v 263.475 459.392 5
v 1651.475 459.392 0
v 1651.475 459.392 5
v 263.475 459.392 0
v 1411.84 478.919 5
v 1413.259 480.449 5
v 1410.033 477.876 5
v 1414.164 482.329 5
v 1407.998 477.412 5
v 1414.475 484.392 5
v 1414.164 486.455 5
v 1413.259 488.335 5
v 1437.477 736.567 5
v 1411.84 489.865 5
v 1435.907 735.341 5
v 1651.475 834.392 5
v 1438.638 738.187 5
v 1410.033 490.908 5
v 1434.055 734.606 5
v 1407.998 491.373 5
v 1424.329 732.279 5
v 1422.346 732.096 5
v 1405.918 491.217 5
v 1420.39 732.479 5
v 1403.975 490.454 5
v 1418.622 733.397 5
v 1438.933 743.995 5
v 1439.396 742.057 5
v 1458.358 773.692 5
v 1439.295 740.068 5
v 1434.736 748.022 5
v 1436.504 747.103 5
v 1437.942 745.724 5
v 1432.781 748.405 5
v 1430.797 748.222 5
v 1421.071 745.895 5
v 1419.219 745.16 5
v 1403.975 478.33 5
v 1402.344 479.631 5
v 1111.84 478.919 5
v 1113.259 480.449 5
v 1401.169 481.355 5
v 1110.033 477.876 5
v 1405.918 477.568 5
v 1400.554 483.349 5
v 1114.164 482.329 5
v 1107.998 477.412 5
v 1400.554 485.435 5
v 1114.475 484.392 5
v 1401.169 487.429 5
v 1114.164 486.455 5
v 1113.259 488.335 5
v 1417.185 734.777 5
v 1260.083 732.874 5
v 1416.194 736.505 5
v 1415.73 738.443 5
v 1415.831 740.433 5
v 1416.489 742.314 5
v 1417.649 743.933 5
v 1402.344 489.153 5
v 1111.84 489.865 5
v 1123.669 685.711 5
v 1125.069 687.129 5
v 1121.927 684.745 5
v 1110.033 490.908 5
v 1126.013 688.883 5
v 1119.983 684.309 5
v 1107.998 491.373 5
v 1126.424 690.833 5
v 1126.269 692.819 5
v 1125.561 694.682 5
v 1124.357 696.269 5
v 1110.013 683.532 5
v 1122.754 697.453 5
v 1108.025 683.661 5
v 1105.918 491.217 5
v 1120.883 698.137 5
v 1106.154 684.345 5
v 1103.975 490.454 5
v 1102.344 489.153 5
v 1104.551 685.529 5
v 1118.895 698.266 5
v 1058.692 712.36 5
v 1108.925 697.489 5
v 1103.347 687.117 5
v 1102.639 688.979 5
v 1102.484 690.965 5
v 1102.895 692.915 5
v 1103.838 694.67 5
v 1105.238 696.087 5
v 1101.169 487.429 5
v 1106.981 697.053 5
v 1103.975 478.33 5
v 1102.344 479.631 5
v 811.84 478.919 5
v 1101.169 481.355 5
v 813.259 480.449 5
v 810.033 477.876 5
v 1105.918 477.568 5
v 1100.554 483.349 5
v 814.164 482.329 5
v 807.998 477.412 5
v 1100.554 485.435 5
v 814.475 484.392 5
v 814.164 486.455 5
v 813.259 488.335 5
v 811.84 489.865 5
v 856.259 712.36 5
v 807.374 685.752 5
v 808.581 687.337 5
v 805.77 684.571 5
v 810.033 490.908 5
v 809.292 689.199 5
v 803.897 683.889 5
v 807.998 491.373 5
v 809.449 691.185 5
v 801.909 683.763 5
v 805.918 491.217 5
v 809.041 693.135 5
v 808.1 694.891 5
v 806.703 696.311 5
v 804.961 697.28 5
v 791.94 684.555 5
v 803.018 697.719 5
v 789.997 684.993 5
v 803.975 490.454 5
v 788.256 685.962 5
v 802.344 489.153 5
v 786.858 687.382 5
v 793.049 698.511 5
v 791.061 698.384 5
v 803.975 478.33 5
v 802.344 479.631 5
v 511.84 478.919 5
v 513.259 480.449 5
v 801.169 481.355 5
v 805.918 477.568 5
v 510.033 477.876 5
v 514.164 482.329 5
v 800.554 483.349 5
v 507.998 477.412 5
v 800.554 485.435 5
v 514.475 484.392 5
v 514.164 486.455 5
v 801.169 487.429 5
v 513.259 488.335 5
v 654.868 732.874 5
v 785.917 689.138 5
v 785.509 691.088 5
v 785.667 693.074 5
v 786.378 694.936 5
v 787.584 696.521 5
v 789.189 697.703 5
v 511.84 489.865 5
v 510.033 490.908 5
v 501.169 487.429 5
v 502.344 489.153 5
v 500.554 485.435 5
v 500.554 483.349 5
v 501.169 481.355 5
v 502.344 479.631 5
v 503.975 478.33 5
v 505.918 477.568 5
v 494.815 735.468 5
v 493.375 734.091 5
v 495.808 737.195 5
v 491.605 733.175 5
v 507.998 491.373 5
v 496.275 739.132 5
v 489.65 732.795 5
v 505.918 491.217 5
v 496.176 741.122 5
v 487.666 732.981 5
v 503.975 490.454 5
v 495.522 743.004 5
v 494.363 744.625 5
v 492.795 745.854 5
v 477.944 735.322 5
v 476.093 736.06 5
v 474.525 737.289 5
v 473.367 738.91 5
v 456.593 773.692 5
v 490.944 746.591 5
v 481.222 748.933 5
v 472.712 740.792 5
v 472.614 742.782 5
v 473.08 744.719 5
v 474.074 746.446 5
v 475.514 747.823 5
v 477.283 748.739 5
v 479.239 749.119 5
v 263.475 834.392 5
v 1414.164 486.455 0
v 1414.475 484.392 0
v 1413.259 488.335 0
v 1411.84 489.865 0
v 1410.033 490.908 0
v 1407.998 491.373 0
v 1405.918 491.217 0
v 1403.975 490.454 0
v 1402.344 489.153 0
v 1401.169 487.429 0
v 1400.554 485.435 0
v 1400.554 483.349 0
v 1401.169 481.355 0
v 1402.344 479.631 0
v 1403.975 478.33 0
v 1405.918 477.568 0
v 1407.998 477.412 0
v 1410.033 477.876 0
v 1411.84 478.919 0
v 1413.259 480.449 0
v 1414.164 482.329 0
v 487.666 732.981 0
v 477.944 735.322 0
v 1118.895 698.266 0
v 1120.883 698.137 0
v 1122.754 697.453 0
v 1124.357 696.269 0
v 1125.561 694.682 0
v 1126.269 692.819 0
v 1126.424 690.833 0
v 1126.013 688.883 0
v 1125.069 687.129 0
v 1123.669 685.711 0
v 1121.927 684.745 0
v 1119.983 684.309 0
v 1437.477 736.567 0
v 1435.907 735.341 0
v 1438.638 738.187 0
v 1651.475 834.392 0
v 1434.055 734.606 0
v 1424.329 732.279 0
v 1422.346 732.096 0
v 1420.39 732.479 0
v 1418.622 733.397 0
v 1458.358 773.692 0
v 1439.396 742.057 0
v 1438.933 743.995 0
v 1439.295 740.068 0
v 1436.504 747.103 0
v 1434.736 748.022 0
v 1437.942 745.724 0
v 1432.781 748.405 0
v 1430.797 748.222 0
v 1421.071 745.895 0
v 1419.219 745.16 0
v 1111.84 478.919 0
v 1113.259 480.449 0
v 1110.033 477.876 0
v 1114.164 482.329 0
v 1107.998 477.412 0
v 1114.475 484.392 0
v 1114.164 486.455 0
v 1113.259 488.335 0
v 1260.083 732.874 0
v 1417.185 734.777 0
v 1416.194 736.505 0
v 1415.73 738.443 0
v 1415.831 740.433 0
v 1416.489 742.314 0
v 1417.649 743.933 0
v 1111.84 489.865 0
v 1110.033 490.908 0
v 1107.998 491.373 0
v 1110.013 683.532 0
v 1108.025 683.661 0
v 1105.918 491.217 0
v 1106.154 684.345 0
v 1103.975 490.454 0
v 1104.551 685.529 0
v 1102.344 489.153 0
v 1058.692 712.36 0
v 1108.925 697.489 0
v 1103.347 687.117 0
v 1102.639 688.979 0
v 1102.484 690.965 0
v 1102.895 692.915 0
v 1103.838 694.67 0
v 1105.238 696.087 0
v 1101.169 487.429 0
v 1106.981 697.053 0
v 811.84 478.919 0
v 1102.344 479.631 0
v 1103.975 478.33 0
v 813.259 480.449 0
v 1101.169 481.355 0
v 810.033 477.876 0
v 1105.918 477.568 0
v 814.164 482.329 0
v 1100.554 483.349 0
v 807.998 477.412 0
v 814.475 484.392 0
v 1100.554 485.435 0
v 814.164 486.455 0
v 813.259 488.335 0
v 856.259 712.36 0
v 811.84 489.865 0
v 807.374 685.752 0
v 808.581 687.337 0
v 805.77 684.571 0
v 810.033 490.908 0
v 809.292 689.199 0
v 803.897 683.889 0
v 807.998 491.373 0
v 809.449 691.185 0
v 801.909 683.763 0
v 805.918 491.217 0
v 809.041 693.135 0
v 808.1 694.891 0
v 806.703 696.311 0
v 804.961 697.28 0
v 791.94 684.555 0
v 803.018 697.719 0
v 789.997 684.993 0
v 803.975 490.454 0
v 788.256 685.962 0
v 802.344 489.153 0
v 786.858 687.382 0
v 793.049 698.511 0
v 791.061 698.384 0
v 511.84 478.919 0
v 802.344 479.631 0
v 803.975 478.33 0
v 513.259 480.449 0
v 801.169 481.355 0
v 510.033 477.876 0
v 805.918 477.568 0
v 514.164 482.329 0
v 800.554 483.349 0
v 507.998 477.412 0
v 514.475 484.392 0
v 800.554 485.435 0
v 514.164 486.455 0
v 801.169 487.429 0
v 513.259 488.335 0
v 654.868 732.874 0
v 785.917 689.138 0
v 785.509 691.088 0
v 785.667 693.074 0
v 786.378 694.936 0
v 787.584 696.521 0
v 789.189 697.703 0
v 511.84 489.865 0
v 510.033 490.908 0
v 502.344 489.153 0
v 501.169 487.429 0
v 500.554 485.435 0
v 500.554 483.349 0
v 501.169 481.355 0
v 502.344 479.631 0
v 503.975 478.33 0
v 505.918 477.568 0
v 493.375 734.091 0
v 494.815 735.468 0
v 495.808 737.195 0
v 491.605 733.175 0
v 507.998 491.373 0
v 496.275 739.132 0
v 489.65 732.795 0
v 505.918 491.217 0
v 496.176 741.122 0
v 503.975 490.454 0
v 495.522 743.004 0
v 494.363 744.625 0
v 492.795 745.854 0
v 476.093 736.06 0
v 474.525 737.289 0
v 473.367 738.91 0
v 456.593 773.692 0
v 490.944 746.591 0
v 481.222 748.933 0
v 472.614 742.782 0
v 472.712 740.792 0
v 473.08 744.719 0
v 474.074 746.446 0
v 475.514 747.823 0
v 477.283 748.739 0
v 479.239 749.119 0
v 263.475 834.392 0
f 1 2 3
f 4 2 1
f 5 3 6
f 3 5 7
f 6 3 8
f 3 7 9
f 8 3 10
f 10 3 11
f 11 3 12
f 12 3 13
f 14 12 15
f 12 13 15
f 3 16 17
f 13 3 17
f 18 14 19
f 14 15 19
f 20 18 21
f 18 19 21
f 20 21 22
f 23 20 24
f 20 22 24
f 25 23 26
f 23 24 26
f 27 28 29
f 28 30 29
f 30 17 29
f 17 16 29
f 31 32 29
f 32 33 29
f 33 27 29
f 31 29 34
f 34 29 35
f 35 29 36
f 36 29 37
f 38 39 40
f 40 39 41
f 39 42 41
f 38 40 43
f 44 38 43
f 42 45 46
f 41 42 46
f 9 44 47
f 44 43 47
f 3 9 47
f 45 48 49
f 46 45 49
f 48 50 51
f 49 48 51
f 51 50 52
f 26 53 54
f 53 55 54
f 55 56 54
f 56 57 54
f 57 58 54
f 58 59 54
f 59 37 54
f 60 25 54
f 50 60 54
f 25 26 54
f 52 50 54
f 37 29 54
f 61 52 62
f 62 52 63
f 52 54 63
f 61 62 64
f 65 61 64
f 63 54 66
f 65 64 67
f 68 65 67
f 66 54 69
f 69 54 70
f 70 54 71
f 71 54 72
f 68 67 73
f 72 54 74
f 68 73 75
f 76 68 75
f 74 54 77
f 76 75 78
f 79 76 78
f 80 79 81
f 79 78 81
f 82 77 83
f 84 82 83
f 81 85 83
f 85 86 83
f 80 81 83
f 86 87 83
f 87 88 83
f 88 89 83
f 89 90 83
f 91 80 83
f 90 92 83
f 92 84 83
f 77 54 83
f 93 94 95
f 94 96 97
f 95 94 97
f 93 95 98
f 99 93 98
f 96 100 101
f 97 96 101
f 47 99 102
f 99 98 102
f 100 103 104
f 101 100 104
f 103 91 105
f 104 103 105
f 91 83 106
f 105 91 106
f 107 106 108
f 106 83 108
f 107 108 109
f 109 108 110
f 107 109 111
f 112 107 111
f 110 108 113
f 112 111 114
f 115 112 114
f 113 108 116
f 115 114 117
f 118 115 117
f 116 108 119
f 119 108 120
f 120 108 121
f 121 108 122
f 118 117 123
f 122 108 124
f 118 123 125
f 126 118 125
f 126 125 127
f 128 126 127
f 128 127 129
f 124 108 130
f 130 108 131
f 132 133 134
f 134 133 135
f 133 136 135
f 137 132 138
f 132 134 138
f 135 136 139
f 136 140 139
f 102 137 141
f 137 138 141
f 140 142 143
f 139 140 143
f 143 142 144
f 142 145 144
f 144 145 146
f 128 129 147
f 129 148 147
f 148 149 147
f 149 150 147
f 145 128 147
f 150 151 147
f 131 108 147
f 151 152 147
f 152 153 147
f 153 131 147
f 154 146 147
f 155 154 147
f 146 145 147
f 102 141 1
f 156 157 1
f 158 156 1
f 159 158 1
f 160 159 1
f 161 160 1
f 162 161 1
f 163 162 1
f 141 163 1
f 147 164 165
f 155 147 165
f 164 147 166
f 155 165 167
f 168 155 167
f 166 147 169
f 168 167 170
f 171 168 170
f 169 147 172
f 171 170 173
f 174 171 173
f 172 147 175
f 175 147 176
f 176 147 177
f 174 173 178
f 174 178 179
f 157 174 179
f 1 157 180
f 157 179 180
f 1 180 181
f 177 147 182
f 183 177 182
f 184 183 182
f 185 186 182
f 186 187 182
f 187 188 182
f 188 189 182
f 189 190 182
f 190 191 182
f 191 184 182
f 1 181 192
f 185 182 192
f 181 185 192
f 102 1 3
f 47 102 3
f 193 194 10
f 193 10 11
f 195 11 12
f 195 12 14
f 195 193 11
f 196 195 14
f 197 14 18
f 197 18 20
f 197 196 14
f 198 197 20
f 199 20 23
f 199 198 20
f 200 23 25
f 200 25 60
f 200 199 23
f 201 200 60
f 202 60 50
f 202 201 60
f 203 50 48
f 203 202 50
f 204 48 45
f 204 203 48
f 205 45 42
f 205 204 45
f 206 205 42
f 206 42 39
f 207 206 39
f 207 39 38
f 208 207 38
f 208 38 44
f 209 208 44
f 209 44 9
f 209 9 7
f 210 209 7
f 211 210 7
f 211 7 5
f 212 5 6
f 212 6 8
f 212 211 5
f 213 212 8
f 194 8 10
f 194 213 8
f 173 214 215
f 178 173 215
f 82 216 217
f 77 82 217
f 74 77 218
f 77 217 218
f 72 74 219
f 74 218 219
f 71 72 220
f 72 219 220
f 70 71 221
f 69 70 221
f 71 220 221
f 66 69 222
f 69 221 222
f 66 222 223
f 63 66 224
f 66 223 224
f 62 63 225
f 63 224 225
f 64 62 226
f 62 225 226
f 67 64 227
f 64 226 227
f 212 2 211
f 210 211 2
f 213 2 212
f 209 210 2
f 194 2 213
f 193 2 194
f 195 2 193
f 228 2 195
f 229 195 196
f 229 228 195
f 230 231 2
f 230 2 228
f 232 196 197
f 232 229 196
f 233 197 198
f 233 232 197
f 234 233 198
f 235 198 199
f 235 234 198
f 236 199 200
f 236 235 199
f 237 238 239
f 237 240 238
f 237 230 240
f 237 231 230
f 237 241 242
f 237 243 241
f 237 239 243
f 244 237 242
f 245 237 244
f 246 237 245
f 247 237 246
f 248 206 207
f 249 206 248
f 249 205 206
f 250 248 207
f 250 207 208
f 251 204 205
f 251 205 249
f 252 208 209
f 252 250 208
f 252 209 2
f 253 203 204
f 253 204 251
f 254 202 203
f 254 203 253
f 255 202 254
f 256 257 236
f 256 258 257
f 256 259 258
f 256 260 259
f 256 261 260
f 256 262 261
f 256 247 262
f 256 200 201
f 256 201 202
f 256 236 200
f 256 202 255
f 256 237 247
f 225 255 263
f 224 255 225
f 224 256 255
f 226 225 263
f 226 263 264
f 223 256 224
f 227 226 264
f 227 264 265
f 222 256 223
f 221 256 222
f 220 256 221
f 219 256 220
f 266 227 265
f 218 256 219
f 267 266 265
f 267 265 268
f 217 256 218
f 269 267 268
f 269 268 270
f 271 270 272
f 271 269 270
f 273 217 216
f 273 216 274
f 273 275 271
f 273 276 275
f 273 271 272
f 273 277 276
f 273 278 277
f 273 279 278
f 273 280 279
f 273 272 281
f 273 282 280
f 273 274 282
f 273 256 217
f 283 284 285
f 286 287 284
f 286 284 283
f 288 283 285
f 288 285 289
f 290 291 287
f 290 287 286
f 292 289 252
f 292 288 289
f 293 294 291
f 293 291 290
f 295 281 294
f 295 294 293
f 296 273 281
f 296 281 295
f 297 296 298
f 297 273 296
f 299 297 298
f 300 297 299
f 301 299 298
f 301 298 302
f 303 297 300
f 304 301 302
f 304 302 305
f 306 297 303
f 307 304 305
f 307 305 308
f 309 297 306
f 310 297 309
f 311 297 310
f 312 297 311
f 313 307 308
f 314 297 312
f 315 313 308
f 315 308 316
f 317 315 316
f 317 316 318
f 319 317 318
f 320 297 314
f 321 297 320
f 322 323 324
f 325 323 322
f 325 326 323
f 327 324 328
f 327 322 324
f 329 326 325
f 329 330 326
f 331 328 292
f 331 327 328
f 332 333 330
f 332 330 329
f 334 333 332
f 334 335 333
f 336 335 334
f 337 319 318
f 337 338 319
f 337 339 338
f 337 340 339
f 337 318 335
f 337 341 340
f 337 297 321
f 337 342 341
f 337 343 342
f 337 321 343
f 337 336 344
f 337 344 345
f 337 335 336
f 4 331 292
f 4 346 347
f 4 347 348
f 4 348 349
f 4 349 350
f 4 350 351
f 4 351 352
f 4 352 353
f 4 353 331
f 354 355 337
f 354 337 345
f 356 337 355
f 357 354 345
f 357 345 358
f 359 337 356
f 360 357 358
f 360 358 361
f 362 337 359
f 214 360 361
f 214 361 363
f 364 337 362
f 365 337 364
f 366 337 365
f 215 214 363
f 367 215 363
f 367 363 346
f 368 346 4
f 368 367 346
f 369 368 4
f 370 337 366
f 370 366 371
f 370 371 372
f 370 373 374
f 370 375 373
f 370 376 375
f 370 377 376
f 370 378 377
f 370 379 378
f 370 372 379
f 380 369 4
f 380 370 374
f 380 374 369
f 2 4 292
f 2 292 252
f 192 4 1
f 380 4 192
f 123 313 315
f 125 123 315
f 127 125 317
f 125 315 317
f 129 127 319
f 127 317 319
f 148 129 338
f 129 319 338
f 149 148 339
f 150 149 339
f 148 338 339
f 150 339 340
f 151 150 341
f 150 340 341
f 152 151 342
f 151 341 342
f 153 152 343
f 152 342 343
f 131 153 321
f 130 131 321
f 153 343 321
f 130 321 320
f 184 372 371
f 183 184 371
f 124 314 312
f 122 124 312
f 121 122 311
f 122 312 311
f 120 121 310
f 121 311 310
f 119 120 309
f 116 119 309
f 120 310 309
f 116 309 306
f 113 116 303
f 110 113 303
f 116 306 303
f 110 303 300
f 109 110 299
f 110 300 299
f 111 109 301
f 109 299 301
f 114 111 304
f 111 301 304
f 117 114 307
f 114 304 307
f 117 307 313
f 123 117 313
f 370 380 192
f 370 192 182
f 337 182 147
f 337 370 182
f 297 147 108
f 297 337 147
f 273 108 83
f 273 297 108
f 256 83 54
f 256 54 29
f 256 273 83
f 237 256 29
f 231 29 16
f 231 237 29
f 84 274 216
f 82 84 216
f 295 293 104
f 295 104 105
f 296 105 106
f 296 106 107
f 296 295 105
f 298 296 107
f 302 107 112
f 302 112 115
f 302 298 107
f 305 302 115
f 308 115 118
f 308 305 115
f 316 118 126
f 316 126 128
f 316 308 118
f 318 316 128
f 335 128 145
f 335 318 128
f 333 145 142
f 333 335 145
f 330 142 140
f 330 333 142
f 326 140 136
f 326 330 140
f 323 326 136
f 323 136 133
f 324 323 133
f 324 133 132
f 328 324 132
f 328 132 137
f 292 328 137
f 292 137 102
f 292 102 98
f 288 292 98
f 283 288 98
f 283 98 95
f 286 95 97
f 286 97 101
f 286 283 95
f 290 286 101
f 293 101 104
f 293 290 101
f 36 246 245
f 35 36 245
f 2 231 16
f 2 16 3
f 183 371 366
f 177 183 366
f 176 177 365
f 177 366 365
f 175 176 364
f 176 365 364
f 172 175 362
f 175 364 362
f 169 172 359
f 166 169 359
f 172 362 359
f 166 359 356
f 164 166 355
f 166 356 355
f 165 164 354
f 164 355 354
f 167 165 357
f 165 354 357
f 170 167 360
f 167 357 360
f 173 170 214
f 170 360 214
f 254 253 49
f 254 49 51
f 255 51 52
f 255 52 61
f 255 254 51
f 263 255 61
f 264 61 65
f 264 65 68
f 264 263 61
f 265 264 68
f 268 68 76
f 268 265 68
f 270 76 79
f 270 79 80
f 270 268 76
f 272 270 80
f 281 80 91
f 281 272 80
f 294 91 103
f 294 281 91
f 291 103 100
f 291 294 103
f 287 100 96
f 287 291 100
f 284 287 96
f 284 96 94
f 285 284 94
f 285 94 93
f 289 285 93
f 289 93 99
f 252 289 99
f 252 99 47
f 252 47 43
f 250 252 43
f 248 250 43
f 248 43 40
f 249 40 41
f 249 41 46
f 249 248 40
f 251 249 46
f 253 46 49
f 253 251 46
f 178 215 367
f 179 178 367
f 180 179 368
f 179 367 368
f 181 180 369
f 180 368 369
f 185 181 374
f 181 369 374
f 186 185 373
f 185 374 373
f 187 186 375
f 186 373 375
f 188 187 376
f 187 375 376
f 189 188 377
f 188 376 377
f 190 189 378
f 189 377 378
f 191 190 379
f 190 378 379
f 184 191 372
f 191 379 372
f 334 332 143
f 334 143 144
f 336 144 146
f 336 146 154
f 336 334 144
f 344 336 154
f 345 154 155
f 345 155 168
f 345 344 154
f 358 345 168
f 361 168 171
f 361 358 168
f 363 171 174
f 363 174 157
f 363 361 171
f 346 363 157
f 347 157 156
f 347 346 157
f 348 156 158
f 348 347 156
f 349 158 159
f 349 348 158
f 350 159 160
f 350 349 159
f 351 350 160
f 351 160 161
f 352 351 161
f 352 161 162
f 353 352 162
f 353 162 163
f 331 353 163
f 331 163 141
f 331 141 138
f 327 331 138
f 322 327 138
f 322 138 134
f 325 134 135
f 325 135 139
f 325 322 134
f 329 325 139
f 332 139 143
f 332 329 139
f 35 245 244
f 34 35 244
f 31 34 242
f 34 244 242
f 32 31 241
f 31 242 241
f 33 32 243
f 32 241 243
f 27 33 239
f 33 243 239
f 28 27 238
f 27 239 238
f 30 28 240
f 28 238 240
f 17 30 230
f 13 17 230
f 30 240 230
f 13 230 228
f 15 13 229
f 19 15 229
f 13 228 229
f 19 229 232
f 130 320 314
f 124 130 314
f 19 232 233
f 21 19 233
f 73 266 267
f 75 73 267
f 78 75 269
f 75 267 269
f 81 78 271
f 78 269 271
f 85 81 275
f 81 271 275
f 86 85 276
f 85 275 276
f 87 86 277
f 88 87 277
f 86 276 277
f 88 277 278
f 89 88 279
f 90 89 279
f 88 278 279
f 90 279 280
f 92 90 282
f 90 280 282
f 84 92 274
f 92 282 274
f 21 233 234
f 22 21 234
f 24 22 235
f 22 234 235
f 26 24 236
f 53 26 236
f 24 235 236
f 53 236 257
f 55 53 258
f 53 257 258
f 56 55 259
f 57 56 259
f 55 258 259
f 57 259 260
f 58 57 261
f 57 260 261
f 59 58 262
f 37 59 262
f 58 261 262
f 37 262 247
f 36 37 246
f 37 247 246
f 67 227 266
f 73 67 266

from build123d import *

# Parameters (mm, degrees)
SKETCH1_R           = 7
BOSS_EXTRUDE1_DEPTH = 5


with BuildPart() as part:
    # Sketch1 → Boss-Extrude1 (new body)
    with BuildSketch(Plane.XY):
        with BuildLine():
            Line((1651.475381164, 459.392203427), (263.475381164, 459.392203427))
            Line((263.475381164, 459.392203427), (263.475381164, 834.392203427))
            ThreePointArc((263.475381164, 834.392203427), (957.475381164, 709.790289397), (1651.475381164, 834.392203427))
            Line((1651.475381164, 834.392203427), (1651.475381164, 459.392203427))
        make_face()
        with Locations((507.475381164, 484.392203427)):
            Circle(SKETCH1_R, mode=Mode.SUBTRACT)
        with Locations((807.475381164, 484.392203427)):
            Circle(SKETCH1_R, mode=Mode.SUBTRACT)
        with Locations((1107.475381164, 484.392203427)):
            Circle(SKETCH1_R, mode=Mode.SUBTRACT)
        with Locations((1407.475381164, 484.392203427)):
            Circle(SKETCH1_R, mode=Mode.SUBTRACT)
        with BuildLine():
            Line((1434.054921304, 734.606048794), (1424.329475699, 732.278881466))
            ThreePointArc((1424.329475699, 732.278881466), (1415.892646645, 737.457676261), (1421.07144144, 745.894505314))
            Line((1421.07144144, 745.894505314), (1430.796887045, 748.221672642))
            ThreePointArc((1430.796887045, 748.221672642), (1439.233716099, 743.042877847), (1434.054921304, 734.606048794))
        make_face(mode=Mode.SUBTRACT)
        with BuildLine():
            Line((1119.982718617, 684.308820718), (1110.01296021, 683.531699563))
            ThreePointArc((1110.01296021, 683.531699563), (1102.490144515, 689.966545639), (1108.924990592, 697.489361333))
            Line((1108.924990592, 697.489361333), (1118.894748999, 698.266482489))
            ThreePointArc((1118.894748999, 698.266482489), (1126.417564694, 691.831636413), (1119.982718617, 684.308820718))
        make_face(mode=Mode.SUBTRACT)
        with BuildLine():
            Line((801.909045951, 683.762551995), (791.940463281, 684.554612313))
            ThreePointArc((791.940463281, 684.554612313), (785.516897635, 692.087062405), (793.049347727, 698.510628051))
            Line((793.049347727, 698.510628051), (803.017930397, 697.718567733))
            ThreePointArc((803.017930397, 697.718567733), (809.441496043, 690.186117641), (801.909045951, 683.762551995))
        make_face(mode=Mode.SUBTRACT)
        with BuildLine():
            Line((487.665932753, 732.980693573), (477.94398541, 735.322432212))
            ThreePointArc((477.94398541, 735.322432212), (472.777839317, 743.767012399), (481.222419504, 748.933158492))
            Line((481.222419504, 748.933158492), (490.944366848, 746.591419854))
            ThreePointArc((490.944366848, 746.591419854), (496.110512941, 738.146839666), (487.665932753, 732.980693573))
        make_face(mode=Mode.SUBTRACT)
    extrude(amount=BOSS_EXTRUDE1_DEPTH)


solid = part.part
